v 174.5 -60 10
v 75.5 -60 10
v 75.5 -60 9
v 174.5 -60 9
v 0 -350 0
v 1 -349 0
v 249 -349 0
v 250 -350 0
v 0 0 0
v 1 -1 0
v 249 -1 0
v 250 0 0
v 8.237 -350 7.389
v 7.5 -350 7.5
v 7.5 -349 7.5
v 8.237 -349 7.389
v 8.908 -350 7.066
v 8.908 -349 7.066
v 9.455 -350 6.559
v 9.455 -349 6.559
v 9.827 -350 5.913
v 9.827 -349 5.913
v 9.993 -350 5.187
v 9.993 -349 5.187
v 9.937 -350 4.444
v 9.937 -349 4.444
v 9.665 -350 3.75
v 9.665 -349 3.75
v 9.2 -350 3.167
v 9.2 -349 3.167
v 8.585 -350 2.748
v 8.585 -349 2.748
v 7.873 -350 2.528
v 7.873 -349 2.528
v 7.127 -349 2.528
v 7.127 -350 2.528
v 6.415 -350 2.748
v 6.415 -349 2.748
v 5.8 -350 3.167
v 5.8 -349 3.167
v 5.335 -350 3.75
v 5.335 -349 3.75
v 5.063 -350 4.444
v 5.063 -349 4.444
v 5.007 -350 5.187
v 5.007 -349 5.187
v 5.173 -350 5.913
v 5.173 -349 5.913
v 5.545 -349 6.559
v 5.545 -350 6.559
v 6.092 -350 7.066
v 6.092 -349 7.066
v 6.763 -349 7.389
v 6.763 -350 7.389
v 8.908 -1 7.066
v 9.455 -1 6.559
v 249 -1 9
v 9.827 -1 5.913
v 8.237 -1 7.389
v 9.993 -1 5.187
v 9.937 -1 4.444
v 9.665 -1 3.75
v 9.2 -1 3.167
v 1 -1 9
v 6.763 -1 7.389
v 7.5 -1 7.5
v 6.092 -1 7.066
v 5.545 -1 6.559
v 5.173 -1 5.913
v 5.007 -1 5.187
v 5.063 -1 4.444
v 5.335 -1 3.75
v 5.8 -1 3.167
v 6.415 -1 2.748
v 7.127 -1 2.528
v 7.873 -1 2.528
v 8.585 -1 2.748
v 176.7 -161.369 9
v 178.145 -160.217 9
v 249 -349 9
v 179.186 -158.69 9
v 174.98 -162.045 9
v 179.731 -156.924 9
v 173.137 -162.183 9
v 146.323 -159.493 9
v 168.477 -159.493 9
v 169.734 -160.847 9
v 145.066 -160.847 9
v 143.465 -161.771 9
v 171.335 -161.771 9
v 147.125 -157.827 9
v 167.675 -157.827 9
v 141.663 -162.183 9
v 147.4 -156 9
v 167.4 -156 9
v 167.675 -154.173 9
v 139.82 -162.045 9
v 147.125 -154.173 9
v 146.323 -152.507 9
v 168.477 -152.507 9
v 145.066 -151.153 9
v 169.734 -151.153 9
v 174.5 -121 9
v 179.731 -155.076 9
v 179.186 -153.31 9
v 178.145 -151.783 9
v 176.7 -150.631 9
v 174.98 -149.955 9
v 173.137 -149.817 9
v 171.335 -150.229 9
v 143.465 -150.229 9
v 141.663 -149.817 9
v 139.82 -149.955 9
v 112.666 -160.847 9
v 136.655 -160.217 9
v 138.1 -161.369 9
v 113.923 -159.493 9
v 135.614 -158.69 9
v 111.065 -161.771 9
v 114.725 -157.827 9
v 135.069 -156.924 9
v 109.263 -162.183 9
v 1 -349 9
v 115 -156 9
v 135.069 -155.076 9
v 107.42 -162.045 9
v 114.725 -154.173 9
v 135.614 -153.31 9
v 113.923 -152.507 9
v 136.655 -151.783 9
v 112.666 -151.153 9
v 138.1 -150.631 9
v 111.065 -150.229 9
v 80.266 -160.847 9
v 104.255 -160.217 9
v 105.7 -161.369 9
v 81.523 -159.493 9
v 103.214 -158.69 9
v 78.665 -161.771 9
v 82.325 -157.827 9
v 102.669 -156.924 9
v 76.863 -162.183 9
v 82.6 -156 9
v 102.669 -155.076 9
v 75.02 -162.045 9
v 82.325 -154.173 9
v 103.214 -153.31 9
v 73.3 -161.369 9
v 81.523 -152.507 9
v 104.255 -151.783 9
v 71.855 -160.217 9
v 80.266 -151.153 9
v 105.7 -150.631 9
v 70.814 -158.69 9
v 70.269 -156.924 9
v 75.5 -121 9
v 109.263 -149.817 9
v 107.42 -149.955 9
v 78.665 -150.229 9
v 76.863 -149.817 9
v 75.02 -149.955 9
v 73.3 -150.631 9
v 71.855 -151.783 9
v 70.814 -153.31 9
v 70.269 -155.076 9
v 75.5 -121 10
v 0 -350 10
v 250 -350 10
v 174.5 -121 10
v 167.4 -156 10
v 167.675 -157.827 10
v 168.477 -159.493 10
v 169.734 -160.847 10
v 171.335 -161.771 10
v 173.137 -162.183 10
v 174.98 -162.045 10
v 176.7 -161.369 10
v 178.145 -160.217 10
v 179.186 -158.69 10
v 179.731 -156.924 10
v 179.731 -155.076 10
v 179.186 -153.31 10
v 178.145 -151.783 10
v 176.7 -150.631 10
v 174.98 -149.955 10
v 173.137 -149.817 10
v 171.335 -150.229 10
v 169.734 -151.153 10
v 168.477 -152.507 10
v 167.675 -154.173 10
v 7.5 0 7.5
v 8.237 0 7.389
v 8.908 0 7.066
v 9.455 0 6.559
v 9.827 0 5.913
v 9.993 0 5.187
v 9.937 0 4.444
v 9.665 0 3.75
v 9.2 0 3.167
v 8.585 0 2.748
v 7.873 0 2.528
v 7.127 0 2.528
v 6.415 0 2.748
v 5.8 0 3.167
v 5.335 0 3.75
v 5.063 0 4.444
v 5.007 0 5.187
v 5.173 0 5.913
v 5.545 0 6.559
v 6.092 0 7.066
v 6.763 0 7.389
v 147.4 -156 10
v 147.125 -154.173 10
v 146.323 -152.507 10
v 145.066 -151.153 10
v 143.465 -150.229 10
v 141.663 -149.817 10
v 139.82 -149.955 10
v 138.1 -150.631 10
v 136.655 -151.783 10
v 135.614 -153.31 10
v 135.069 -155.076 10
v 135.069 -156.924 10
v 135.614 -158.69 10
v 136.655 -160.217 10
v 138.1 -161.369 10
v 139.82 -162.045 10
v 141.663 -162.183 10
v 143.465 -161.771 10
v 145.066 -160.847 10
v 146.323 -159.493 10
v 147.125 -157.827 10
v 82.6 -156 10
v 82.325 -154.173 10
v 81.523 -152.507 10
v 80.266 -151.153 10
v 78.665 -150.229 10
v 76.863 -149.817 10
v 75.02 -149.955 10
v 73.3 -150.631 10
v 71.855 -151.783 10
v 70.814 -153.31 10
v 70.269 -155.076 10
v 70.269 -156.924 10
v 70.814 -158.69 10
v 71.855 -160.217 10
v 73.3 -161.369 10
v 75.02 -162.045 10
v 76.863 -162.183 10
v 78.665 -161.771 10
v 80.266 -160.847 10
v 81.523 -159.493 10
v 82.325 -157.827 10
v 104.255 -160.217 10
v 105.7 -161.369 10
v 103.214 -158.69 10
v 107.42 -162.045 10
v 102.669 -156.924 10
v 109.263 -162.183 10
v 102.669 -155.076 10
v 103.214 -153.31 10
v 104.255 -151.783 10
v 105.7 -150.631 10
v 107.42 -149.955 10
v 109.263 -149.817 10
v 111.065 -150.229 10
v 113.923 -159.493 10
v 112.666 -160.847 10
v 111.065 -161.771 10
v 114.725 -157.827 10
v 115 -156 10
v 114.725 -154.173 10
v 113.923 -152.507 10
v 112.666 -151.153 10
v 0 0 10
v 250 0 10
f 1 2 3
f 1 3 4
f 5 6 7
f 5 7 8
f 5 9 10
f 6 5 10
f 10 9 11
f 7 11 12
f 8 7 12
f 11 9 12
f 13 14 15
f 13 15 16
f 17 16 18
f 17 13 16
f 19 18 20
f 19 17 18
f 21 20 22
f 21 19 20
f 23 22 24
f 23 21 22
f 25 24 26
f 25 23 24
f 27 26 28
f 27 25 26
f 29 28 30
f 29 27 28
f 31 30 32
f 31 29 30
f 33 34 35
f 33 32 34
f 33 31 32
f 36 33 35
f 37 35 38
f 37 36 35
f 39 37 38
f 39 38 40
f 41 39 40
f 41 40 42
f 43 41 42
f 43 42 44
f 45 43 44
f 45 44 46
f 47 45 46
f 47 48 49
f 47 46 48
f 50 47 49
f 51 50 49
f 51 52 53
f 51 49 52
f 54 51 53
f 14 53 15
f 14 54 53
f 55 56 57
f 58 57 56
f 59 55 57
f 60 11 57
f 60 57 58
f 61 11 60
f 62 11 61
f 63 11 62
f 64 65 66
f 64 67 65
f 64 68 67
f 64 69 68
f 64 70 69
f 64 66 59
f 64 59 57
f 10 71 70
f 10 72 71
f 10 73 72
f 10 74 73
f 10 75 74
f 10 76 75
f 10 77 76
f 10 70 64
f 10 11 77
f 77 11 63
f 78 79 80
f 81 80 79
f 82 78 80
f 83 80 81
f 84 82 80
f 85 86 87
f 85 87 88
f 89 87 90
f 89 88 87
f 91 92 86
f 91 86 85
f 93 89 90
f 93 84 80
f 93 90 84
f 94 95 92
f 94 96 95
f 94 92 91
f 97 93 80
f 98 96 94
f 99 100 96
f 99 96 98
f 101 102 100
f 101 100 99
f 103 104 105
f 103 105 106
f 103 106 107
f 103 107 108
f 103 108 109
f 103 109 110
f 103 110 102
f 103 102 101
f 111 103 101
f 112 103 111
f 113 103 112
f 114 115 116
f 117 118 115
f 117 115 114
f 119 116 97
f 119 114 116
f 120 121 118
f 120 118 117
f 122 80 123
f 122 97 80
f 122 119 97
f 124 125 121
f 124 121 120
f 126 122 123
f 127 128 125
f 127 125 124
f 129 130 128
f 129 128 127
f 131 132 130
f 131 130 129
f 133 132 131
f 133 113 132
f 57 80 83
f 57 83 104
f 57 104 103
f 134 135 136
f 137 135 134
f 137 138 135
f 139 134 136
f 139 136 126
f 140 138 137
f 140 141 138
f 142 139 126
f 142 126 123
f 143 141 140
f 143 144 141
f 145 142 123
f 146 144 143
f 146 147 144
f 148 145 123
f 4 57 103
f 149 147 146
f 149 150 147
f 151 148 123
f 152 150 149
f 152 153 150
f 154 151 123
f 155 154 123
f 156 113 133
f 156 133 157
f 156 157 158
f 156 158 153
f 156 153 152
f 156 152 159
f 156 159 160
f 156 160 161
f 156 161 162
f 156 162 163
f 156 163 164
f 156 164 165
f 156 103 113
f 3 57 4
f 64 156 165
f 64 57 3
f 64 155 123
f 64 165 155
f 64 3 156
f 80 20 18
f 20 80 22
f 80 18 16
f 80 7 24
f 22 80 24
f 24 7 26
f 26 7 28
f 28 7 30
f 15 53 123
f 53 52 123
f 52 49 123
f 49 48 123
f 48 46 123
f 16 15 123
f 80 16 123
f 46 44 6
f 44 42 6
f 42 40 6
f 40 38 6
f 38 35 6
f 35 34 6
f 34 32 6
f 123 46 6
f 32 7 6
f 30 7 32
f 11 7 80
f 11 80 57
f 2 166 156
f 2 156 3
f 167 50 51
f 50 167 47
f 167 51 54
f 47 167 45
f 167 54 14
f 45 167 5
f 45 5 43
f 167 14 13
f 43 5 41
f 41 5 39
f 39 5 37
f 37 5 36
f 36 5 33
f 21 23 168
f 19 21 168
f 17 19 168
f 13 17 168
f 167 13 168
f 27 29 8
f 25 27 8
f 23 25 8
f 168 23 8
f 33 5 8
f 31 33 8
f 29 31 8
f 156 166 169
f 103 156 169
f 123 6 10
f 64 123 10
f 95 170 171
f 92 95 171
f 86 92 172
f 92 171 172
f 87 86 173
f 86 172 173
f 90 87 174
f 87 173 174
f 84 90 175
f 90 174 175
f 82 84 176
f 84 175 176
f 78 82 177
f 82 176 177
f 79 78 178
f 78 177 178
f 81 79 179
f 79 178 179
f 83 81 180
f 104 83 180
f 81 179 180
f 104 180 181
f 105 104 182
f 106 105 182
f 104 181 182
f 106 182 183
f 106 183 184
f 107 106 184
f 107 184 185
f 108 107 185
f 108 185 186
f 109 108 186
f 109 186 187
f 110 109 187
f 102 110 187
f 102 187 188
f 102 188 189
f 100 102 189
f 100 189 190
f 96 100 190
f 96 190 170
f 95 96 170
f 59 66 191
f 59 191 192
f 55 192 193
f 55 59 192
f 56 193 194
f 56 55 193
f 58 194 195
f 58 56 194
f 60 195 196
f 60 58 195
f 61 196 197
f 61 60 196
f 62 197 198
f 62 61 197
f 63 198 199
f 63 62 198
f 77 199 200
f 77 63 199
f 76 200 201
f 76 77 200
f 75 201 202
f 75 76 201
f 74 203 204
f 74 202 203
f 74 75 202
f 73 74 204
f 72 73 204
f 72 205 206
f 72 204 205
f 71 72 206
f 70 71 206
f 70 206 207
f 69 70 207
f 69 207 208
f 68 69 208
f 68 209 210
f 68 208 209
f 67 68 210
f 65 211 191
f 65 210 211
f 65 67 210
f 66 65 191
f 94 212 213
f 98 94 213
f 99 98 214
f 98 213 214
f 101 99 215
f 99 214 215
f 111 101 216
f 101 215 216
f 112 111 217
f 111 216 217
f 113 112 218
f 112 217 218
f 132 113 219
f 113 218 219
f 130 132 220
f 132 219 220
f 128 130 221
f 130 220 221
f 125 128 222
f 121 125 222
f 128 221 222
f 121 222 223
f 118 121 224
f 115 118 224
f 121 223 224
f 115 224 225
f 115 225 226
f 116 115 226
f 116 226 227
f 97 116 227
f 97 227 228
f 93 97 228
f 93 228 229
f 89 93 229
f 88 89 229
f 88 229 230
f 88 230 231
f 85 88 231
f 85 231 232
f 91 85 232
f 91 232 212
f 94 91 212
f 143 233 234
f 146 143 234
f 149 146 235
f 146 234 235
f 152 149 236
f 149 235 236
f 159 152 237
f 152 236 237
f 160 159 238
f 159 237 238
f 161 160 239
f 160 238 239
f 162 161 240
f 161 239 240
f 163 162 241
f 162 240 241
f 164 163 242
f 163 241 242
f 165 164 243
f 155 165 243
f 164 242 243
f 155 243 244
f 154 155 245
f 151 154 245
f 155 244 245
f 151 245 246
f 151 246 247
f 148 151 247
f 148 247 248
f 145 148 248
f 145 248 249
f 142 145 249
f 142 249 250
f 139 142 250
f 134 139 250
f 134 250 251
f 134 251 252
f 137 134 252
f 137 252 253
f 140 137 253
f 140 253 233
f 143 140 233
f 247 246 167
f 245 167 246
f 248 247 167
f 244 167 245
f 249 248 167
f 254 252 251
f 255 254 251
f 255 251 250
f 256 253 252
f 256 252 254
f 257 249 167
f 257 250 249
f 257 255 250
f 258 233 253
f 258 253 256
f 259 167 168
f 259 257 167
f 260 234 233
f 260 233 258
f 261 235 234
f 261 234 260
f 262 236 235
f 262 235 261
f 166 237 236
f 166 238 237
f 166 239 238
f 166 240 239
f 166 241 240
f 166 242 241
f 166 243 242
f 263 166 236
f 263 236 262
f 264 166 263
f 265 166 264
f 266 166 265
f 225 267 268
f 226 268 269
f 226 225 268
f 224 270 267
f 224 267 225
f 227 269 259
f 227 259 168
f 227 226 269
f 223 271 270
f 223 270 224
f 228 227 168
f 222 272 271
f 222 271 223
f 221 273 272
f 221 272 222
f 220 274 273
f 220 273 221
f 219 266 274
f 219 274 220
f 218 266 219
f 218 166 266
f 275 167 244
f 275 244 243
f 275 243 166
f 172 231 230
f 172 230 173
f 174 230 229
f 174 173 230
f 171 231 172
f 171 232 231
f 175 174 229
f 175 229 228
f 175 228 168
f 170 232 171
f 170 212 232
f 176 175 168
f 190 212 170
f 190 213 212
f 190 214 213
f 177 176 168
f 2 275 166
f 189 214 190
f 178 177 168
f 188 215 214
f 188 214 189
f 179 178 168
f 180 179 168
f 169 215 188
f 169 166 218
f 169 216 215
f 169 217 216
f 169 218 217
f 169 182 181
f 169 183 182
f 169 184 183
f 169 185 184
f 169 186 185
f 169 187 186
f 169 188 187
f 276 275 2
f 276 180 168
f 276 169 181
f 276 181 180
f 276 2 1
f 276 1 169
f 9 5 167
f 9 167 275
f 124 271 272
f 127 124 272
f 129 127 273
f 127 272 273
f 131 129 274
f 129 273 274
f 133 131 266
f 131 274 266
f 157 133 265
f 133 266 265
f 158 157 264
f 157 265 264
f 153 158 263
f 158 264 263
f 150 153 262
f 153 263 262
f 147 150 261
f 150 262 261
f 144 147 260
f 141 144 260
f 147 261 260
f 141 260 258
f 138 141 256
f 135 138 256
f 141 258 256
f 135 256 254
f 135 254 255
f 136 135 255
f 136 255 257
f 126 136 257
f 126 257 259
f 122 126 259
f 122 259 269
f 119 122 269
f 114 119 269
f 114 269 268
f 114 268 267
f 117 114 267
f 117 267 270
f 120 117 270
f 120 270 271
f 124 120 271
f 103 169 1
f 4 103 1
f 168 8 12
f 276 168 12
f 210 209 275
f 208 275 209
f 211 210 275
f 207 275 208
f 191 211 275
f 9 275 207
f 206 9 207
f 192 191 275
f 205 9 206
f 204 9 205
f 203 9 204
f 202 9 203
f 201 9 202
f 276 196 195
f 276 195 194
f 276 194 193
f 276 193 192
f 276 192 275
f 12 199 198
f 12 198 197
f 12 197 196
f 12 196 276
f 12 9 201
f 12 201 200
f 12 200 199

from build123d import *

# Parameters (mm, degrees)
SKETCH1_W               = 250
SKETCH1_H               = 350
BOSS_EXTRUDE1_DEPTH     = 10
SKETCH2_W               = 248
SKETCH2_H               = 348
CUT_EXTRUDE1_DEPTH      = 9
CUT_EXTRUDE2_DEPTH      = 431.232495286
CUT_EXTRUDE2_DEPTH_BACK = 431.232495286
SKETCH3_R               = 2.5
SKETCH4_W               = 99
SKETCH4_H               = 61
CUT_EXTRUDE3_DEPTH      = 10
CUT_EXTRUDE4_REACH      = 432.232
SKETCH5_R               = 6.2


with BuildPart() as part:
    # Sketch1 → Boss-Extrude1 (new body)
    with BuildSketch(Plane.XY):
        with Locations((125, -175)):
            Rectangle(SKETCH1_W, SKETCH1_H)
    extrude(amount=BOSS_EXTRUDE1_DEPTH)

    # Sketch2 → Cut-Extrude1 (cut)
    with BuildSketch(Plane(origin=(0, 0, 0), x_dir=(-1, 0, 0), z_dir=(0, 0, -1))):
        with Locations((-125, -175)):
            Rectangle(SKETCH2_W, SKETCH2_H)
    extrude(amount=-CUT_EXTRUDE1_DEPTH, mode=Mode.SUBTRACT)

    # Sketch3 → Cut-Extrude2 (cut, two sides: drawn at the far end of the back side and taken through both)
    with BuildSketch(Plane(origin=(0, 0, 0), x_dir=(1, 0, 0), z_dir=(0, 1, 0)).offset(-CUT_EXTRUDE2_DEPTH_BACK)):
        with Locations(Location((7.5, -5, 0), (0, 0, 270))):
            Circle(SKETCH3_R)
    extrude(amount=CUT_EXTRUDE2_DEPTH + CUT_EXTRUDE2_DEPTH_BACK, mode=Mode.SUBTRACT)

    # Sketch4 → Cut-Extrude3 (cut)
    with BuildSketch(Plane.XY.offset(10)):
        with Locations((125, -90.5)):
            Rectangle(SKETCH4_W, SKETCH4_H)
    extrude(amount=-CUT_EXTRUDE3_DEPTH, mode=Mode.SUBTRACT)

    # Sketch5 → Cut-Extrude4 (cut, up to next)
    with BuildSketch(Plane.XY.offset(10), mode=Mode.PRIVATE) as cut_extrude4_sk1:
        with Locations((108.8, -156)):
            Circle(SKETCH5_R)
    cut_extrude4_tool1 = extrude(cut_extrude4_sk1.sketch, amount=-CUT_EXTRUDE4_REACH, mode=Mode.PRIVATE) & part.part
    # Sketch5 → Cut-Extrude4 (cut, up to next)
    with BuildSketch(Plane.XY.offset(10), mode=Mode.PRIVATE) as cut_extrude4_sk2:
        with Locations((141.2, -156)):
            Circle(SKETCH5_R)
    cut_extrude4_tool2 = extrude(cut_extrude4_sk2.sketch, amount=-CUT_EXTRUDE4_REACH, mode=Mode.PRIVATE) & part.part
    # Sketch5 → Cut-Extrude4 (cut, up to next)
    with BuildSketch(Plane.XY.offset(10), mode=Mode.PRIVATE) as cut_extrude4_sk3:
        with Locations((76.4, -156)):
            Circle(SKETCH5_R)
    cut_extrude4_tool3 = extrude(cut_extrude4_sk3.sketch, amount=-CUT_EXTRUDE4_REACH, mode=Mode.PRIVATE) & part.part
    # Sketch5 → Cut-Extrude4 (cut, up to next)
    with BuildSketch(Plane.XY.offset(10), mode=Mode.PRIVATE) as cut_extrude4_sk4:
        with Locations(Location((173.6, -156, 0), (0, 0, 180))):
            Circle(SKETCH5_R)
    cut_extrude4_tool4 = extrude(cut_extrude4_sk4.sketch, amount=-CUT_EXTRUDE4_REACH, mode=Mode.PRIVATE) & part.part
    add(cut_extrude4_tool1.solids().sort_by_distance((108.8, -156, 10))[0], mode=Mode.SUBTRACT)
    add(cut_extrude4_tool2.solids().sort_by_distance((141.2, -156, 10))[0], mode=Mode.SUBTRACT)
    add(cut_extrude4_tool3.solids().sort_by_distance((76.4, -156, 10))[0], mode=Mode.SUBTRACT)
    add(cut_extrude4_tool4.solids().sort_by_distance((173.6, -156, 10))[0], mode=Mode.SUBTRACT)


solid = part.part
